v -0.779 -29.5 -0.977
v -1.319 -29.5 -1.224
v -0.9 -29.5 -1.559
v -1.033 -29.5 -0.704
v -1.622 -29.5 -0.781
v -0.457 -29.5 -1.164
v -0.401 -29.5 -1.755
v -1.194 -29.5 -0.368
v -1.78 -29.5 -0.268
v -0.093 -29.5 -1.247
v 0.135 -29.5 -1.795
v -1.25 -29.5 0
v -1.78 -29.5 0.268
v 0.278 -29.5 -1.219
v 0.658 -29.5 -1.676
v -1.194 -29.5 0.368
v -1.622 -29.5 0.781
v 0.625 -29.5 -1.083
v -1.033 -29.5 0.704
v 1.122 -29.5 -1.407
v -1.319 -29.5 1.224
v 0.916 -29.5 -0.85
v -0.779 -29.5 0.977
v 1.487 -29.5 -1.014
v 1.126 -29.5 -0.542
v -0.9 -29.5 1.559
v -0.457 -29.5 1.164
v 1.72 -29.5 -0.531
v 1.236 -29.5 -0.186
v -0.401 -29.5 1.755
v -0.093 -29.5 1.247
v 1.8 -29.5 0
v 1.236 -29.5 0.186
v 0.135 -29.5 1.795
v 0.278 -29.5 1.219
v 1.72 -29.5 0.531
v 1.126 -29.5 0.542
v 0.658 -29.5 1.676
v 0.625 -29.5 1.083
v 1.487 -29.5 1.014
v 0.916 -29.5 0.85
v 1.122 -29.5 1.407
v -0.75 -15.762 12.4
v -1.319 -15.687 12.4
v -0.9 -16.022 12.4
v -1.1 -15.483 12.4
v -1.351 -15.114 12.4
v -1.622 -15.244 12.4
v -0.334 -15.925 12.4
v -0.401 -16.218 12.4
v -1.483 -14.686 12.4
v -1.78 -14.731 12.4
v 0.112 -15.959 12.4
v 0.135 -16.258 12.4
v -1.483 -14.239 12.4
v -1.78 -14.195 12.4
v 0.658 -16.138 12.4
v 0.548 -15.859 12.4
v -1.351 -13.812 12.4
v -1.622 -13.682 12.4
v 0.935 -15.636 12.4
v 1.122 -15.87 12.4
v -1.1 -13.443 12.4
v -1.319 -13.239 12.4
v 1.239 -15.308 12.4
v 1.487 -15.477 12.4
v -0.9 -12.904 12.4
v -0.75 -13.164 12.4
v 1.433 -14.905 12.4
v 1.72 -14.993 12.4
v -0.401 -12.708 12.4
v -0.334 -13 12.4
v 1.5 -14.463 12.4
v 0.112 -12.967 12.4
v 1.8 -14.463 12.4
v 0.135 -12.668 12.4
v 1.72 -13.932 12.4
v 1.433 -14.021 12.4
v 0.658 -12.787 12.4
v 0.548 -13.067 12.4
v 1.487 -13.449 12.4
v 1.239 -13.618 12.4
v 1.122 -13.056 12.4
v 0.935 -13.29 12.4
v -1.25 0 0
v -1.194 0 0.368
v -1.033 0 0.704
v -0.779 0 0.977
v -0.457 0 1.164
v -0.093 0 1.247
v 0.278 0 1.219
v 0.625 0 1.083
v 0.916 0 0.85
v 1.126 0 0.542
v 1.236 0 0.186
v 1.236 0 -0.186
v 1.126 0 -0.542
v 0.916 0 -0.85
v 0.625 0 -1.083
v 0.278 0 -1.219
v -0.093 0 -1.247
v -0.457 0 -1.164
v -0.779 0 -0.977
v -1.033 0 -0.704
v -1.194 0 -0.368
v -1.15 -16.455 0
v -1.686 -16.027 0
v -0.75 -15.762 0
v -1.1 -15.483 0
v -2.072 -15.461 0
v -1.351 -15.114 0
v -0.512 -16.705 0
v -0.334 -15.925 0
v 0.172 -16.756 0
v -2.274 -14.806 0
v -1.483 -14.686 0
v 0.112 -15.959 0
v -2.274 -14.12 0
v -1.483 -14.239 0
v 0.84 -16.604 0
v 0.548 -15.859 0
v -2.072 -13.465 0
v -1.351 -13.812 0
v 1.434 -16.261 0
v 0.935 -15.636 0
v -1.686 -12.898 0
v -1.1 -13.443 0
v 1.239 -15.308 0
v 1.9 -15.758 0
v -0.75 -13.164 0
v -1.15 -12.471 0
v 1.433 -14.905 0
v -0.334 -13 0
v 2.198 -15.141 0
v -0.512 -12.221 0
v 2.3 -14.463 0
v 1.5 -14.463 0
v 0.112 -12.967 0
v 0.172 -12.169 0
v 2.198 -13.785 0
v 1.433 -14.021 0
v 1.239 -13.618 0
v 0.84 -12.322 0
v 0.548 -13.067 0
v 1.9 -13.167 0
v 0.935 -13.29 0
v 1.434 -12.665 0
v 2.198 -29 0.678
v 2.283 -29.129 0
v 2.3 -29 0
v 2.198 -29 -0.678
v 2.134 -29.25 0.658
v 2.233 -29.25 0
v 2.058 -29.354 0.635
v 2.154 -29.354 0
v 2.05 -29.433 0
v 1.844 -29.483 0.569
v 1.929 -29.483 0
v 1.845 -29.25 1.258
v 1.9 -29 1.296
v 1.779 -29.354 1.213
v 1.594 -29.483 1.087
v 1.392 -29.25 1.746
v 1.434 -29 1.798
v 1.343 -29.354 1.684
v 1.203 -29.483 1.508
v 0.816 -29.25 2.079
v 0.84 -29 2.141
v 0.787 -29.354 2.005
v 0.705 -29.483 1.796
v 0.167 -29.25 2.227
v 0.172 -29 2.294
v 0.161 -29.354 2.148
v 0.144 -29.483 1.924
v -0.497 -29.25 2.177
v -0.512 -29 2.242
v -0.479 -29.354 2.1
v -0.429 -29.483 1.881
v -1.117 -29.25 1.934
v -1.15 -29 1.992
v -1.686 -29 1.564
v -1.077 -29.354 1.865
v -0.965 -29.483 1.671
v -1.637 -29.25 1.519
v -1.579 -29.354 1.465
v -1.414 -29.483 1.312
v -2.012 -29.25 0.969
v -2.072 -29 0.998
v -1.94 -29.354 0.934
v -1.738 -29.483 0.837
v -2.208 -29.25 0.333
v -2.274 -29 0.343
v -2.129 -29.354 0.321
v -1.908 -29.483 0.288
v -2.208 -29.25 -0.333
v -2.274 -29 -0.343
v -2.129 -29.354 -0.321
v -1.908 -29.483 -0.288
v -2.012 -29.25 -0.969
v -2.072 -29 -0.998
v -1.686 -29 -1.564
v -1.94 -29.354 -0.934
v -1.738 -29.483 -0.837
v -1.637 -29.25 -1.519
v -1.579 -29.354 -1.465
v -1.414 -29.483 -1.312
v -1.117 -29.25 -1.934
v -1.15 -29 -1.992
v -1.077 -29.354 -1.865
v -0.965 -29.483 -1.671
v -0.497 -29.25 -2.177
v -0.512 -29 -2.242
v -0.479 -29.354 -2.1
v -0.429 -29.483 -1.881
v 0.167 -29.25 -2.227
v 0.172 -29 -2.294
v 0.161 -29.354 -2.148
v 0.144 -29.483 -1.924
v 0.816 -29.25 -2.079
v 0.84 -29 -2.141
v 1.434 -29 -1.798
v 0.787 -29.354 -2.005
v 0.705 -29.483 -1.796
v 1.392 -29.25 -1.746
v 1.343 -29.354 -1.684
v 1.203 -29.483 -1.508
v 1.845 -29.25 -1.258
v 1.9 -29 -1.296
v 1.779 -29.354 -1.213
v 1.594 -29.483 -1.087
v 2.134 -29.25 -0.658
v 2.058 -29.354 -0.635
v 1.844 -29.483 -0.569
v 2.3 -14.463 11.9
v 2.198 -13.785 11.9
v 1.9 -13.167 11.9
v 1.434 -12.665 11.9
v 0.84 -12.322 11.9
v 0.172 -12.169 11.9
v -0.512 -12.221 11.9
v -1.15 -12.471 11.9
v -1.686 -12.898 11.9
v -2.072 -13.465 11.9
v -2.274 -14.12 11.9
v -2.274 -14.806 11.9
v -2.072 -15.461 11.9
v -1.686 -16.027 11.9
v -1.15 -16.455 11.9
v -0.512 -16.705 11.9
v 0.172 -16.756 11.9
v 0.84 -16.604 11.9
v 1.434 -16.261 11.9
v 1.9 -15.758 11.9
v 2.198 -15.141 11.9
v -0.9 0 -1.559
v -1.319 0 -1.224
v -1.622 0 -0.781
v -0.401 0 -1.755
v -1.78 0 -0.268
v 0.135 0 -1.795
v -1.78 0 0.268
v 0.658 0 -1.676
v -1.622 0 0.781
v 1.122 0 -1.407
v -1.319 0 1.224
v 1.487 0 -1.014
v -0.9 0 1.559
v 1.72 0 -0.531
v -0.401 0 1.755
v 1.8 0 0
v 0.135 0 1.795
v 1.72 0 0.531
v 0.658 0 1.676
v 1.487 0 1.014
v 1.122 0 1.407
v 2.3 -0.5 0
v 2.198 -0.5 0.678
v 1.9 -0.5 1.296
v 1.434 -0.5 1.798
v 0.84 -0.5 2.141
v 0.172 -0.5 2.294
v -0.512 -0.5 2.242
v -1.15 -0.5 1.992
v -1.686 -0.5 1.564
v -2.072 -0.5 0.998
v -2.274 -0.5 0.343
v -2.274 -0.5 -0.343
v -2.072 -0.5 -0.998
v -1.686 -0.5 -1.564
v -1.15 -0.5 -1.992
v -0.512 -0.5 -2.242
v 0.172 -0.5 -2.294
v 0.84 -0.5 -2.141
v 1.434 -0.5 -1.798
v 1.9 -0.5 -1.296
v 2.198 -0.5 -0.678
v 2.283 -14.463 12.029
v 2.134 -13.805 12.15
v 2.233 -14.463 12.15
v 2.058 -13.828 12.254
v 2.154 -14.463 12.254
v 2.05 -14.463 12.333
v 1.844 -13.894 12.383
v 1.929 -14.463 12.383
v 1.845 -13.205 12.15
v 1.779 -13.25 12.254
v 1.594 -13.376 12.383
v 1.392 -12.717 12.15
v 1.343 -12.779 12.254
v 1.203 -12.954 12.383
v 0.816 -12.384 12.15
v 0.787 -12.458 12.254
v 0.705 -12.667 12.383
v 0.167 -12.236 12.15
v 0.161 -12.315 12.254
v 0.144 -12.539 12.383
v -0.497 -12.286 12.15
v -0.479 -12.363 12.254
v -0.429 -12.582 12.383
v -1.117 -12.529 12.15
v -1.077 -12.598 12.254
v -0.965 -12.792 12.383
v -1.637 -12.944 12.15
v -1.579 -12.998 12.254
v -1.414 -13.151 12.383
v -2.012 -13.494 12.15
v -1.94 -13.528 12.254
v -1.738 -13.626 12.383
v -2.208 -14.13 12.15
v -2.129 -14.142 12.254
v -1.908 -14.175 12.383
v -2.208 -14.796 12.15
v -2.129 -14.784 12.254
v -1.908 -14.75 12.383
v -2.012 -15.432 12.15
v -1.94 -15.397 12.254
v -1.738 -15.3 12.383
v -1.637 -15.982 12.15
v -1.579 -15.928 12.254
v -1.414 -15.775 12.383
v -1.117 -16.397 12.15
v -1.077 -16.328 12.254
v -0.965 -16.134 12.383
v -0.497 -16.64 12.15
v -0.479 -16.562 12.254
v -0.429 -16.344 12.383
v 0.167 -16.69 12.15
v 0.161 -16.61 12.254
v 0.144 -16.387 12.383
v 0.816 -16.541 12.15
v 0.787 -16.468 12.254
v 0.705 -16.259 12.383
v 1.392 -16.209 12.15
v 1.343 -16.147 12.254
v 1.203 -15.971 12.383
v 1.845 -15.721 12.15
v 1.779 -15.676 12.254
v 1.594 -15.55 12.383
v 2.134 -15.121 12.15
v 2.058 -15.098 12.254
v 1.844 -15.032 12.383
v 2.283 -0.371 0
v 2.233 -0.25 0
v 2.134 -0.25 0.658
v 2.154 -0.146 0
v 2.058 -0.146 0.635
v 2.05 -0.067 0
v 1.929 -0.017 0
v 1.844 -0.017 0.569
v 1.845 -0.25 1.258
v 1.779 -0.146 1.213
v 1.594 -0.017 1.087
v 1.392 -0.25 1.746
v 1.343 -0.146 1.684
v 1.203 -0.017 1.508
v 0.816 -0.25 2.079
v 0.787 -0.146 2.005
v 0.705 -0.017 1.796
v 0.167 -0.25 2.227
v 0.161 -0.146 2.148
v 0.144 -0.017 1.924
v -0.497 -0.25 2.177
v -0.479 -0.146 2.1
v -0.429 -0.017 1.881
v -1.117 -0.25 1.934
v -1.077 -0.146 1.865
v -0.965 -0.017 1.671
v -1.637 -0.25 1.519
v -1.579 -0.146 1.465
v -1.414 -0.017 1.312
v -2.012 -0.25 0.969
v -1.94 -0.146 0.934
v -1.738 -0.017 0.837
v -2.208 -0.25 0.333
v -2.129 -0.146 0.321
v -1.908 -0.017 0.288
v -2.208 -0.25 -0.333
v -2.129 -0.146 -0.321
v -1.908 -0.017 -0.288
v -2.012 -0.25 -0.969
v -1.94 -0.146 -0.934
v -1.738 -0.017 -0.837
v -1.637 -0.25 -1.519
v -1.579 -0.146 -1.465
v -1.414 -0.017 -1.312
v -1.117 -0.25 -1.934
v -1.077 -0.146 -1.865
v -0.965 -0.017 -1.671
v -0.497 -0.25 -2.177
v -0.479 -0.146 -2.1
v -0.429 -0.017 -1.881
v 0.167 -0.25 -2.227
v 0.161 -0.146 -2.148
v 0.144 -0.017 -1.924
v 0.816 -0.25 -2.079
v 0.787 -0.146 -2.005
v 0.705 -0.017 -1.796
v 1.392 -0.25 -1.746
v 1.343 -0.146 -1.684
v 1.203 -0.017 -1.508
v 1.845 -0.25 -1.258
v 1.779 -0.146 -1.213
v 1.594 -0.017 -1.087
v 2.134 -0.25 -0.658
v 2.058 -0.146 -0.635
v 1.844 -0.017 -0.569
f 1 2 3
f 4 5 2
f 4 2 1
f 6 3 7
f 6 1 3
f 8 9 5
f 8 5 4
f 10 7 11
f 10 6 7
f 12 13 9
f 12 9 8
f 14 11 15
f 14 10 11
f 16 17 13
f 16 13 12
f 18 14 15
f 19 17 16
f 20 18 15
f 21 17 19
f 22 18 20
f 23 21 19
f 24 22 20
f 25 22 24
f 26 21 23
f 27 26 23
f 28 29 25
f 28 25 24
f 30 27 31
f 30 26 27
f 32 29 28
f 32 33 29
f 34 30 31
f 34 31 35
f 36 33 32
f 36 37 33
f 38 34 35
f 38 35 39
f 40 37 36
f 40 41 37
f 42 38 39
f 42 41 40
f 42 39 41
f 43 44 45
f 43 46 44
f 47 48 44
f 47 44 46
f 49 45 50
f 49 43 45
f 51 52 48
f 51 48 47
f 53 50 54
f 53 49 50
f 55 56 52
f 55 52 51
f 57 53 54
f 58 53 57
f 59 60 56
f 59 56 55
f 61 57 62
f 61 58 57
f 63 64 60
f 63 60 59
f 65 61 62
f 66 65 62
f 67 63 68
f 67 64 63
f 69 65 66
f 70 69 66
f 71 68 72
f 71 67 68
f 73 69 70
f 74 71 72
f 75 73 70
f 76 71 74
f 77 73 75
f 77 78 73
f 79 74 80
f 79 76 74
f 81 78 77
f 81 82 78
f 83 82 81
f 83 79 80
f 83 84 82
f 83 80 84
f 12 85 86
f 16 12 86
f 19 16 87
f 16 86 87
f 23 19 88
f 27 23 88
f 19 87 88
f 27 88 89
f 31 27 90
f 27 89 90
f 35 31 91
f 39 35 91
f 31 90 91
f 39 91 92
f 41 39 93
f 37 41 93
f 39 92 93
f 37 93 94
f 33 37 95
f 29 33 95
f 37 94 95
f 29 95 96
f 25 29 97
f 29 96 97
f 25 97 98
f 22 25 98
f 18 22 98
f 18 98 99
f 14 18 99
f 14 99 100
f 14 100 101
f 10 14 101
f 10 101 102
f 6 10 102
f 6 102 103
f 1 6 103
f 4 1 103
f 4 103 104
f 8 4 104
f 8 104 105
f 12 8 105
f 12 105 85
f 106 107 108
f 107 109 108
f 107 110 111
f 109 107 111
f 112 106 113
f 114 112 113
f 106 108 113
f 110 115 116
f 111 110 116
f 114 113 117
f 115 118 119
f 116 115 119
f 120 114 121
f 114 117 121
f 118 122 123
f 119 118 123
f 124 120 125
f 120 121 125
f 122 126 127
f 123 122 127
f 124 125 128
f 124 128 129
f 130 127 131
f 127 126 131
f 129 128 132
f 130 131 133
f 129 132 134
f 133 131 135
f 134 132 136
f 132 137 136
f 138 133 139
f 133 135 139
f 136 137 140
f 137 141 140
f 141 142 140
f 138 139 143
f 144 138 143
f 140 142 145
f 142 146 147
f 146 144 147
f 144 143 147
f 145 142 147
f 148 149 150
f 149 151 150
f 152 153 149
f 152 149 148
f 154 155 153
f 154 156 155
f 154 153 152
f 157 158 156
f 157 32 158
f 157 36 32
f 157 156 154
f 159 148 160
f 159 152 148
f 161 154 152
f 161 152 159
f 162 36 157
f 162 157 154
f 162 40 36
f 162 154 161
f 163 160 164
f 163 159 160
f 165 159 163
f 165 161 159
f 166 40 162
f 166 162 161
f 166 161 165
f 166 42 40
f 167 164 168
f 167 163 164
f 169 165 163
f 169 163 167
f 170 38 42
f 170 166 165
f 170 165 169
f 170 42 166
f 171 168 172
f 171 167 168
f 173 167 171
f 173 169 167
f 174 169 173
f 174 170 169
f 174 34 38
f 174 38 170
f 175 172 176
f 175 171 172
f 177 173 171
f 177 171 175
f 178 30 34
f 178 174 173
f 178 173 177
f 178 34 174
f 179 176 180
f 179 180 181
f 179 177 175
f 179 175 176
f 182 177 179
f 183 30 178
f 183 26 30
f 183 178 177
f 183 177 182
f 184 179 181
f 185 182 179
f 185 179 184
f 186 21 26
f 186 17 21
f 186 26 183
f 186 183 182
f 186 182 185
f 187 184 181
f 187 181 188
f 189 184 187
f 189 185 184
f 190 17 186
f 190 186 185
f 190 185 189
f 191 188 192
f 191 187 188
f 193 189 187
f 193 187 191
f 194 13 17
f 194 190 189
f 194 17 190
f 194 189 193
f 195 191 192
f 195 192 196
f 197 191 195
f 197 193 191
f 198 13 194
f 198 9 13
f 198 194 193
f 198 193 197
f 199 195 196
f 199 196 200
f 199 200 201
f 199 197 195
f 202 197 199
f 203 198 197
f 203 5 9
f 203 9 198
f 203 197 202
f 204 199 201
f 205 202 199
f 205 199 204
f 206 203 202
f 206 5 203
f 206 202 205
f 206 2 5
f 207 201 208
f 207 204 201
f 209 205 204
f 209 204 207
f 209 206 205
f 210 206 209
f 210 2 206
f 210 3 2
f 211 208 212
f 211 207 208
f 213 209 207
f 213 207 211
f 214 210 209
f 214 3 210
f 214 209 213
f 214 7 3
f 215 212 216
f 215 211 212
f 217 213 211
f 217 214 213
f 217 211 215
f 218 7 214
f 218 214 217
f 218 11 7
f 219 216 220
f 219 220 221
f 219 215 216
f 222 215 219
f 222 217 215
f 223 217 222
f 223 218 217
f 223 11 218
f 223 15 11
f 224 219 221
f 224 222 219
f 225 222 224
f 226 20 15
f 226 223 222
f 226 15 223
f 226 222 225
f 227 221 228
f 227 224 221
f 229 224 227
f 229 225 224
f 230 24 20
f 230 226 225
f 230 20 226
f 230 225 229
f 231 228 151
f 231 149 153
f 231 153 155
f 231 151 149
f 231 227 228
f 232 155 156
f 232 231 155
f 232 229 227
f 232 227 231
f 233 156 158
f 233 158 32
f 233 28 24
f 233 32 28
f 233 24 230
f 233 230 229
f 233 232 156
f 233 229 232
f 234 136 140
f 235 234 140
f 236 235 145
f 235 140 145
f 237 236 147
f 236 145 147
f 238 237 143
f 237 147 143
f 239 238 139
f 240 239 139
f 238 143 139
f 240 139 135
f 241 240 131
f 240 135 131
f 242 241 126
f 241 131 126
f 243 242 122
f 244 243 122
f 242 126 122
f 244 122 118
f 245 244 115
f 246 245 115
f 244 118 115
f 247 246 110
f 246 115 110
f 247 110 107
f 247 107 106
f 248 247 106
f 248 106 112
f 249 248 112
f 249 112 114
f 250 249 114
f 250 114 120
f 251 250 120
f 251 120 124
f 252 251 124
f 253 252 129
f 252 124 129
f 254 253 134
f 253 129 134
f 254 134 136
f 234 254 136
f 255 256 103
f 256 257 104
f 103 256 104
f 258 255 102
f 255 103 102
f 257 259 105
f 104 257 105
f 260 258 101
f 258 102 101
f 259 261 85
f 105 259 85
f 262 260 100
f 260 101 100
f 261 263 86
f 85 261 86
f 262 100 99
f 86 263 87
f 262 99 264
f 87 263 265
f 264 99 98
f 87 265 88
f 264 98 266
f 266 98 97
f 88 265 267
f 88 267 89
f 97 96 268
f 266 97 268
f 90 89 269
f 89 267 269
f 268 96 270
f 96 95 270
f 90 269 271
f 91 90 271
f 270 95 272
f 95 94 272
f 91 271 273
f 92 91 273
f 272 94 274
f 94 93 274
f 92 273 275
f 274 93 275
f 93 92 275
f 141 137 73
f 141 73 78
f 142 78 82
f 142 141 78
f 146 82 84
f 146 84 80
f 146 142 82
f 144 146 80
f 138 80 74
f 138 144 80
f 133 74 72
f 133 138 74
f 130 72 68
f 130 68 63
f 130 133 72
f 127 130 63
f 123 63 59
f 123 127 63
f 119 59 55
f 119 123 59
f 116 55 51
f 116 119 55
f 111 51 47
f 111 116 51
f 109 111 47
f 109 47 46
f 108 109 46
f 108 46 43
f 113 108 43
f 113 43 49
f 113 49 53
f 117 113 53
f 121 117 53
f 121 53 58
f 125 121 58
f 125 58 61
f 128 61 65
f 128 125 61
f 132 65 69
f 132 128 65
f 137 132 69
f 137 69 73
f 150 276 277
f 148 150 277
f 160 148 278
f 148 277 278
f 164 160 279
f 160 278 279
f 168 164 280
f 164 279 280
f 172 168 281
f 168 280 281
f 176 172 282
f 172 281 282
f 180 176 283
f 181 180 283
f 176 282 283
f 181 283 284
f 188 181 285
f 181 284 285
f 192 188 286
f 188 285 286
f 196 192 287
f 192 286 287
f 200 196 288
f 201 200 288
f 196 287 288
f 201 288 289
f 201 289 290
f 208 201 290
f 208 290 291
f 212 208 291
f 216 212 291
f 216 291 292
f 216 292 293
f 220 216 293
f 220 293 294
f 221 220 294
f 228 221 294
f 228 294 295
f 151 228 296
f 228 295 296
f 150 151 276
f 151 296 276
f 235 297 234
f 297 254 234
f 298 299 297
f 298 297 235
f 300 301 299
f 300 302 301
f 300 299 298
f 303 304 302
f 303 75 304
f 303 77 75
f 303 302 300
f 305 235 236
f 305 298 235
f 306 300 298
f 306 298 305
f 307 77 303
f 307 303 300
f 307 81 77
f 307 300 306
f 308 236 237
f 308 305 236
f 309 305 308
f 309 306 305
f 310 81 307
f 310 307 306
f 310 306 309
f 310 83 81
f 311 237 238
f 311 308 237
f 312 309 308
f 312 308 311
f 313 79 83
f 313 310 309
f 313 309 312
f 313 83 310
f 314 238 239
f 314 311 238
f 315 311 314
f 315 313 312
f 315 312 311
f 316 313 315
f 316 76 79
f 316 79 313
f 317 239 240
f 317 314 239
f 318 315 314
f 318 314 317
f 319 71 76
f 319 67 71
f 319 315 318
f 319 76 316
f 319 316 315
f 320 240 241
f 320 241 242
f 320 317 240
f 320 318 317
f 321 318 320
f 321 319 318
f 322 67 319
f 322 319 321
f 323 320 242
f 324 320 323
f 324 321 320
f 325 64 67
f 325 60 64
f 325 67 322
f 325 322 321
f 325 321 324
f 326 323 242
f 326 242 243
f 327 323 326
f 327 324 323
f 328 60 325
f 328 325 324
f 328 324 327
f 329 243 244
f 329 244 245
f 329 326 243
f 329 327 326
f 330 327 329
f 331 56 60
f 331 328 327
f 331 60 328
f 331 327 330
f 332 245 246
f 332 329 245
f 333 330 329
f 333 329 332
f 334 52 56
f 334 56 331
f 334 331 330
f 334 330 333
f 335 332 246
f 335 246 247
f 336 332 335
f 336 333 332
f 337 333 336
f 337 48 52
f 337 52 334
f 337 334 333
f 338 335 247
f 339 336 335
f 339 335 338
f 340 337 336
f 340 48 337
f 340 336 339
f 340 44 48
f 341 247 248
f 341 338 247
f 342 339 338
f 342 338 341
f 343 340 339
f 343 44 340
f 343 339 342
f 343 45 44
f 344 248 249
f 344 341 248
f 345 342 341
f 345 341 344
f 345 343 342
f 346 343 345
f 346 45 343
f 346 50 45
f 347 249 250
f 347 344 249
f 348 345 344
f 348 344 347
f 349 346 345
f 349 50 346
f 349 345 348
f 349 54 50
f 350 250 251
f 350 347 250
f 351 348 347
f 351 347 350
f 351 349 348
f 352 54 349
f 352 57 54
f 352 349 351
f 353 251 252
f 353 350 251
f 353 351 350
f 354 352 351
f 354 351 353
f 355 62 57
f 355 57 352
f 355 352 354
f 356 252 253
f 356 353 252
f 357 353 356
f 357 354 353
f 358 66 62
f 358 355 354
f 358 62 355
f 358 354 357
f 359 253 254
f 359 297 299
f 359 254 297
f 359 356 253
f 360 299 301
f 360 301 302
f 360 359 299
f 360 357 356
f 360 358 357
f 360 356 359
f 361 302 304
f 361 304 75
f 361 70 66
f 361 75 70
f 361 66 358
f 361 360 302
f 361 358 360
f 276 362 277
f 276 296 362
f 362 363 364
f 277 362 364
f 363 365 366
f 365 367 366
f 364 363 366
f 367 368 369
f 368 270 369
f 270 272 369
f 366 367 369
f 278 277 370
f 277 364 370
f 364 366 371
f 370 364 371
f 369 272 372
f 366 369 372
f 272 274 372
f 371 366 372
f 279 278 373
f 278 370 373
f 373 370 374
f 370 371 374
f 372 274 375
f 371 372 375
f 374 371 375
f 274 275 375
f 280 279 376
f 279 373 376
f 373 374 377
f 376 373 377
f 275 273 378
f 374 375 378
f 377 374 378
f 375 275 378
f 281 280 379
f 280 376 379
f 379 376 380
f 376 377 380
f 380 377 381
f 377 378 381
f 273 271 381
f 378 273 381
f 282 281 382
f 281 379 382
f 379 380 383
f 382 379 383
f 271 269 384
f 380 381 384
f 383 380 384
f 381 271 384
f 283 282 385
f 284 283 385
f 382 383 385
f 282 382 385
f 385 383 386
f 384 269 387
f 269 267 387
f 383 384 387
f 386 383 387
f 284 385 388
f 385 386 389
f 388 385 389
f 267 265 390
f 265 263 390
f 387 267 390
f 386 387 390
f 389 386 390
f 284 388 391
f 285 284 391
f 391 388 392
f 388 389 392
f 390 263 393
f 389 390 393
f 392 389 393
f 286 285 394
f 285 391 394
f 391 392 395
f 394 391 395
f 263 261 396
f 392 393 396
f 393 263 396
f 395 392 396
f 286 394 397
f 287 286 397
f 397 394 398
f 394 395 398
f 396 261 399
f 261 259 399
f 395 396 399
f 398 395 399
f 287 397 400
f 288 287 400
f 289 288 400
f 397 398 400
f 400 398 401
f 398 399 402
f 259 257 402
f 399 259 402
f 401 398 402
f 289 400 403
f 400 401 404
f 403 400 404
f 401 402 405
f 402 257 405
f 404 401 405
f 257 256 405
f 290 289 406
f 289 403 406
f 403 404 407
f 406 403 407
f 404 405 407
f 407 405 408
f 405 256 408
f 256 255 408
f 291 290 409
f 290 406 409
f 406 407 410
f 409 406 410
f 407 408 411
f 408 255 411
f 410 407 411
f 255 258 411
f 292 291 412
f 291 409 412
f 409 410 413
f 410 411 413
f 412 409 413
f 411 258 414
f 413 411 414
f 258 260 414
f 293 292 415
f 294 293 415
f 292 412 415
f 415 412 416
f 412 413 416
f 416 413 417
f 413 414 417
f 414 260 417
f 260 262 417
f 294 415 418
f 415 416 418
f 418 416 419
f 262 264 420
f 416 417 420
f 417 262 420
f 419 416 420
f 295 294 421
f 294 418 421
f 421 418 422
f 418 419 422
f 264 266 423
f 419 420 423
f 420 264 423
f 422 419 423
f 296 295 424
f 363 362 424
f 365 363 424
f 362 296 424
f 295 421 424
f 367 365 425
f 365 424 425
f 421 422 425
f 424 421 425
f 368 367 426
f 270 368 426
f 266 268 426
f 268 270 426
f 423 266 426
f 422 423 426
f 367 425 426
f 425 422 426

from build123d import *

# Parameters (mm, degrees)
F0_R     = 2.3
F1_DEPTH = 29.5
F3_D     = 2.5
F4_R     = 2.3
F5_DEPTH = 12.4
F6_R     = 1.5
F7_DEPTH = 12.4
F8_R     = 0.5
F9_R     = 0.5
F10_R    = 0.5


with BuildPart() as f1:
    # F0 (on Front) → F1 (new body)
    with BuildSketch(Plane.XZ):
        Circle(F0_R)
    extrude(amount=F1_DEPTH)

    # F3 (through all)
    with Locations(Plane.XZ.offset(29.5)):
        with Locations((0, 0)):
            Hole(F3_D / 2)

    # F9
    f9_edges = [f1.edges().sort_by_distance(p)[0] for p in [
        (-2.3, -29.5, 0),
    ]]
    fillet(f9_edges, radius=F9_R)

    # F10
    f10_edges = [f1.edges().sort_by_distance(p)[0] for p in [
        (-2.3, 0, 0),
    ]]
    fillet(f10_edges, radius=F10_R)


with BuildPart() as f5:
    # F4 (on Top) → F5 (new body)
    with BuildSketch(Plane.XY):
        with Locations((0, -14.4628454)):
            Circle(F4_R)
    extrude(amount=F5_DEPTH)

    # F6 (on Top) → F7 (cut)
    with BuildSketch(Plane.XY):
        with Locations((0, -14.4628454)):
            Circle(F6_R)
    extrude(amount=F7_DEPTH, mode=Mode.SUBTRACT)

    # F8
    f8_edges = [f5.edges().sort_by_distance(p)[0] for p in [
        (-2.3, -14.462845, 12.4),
    ]]
    fillet(f8_edges, radius=F8_R)


solid = Compound([f1.part, f5.part])
